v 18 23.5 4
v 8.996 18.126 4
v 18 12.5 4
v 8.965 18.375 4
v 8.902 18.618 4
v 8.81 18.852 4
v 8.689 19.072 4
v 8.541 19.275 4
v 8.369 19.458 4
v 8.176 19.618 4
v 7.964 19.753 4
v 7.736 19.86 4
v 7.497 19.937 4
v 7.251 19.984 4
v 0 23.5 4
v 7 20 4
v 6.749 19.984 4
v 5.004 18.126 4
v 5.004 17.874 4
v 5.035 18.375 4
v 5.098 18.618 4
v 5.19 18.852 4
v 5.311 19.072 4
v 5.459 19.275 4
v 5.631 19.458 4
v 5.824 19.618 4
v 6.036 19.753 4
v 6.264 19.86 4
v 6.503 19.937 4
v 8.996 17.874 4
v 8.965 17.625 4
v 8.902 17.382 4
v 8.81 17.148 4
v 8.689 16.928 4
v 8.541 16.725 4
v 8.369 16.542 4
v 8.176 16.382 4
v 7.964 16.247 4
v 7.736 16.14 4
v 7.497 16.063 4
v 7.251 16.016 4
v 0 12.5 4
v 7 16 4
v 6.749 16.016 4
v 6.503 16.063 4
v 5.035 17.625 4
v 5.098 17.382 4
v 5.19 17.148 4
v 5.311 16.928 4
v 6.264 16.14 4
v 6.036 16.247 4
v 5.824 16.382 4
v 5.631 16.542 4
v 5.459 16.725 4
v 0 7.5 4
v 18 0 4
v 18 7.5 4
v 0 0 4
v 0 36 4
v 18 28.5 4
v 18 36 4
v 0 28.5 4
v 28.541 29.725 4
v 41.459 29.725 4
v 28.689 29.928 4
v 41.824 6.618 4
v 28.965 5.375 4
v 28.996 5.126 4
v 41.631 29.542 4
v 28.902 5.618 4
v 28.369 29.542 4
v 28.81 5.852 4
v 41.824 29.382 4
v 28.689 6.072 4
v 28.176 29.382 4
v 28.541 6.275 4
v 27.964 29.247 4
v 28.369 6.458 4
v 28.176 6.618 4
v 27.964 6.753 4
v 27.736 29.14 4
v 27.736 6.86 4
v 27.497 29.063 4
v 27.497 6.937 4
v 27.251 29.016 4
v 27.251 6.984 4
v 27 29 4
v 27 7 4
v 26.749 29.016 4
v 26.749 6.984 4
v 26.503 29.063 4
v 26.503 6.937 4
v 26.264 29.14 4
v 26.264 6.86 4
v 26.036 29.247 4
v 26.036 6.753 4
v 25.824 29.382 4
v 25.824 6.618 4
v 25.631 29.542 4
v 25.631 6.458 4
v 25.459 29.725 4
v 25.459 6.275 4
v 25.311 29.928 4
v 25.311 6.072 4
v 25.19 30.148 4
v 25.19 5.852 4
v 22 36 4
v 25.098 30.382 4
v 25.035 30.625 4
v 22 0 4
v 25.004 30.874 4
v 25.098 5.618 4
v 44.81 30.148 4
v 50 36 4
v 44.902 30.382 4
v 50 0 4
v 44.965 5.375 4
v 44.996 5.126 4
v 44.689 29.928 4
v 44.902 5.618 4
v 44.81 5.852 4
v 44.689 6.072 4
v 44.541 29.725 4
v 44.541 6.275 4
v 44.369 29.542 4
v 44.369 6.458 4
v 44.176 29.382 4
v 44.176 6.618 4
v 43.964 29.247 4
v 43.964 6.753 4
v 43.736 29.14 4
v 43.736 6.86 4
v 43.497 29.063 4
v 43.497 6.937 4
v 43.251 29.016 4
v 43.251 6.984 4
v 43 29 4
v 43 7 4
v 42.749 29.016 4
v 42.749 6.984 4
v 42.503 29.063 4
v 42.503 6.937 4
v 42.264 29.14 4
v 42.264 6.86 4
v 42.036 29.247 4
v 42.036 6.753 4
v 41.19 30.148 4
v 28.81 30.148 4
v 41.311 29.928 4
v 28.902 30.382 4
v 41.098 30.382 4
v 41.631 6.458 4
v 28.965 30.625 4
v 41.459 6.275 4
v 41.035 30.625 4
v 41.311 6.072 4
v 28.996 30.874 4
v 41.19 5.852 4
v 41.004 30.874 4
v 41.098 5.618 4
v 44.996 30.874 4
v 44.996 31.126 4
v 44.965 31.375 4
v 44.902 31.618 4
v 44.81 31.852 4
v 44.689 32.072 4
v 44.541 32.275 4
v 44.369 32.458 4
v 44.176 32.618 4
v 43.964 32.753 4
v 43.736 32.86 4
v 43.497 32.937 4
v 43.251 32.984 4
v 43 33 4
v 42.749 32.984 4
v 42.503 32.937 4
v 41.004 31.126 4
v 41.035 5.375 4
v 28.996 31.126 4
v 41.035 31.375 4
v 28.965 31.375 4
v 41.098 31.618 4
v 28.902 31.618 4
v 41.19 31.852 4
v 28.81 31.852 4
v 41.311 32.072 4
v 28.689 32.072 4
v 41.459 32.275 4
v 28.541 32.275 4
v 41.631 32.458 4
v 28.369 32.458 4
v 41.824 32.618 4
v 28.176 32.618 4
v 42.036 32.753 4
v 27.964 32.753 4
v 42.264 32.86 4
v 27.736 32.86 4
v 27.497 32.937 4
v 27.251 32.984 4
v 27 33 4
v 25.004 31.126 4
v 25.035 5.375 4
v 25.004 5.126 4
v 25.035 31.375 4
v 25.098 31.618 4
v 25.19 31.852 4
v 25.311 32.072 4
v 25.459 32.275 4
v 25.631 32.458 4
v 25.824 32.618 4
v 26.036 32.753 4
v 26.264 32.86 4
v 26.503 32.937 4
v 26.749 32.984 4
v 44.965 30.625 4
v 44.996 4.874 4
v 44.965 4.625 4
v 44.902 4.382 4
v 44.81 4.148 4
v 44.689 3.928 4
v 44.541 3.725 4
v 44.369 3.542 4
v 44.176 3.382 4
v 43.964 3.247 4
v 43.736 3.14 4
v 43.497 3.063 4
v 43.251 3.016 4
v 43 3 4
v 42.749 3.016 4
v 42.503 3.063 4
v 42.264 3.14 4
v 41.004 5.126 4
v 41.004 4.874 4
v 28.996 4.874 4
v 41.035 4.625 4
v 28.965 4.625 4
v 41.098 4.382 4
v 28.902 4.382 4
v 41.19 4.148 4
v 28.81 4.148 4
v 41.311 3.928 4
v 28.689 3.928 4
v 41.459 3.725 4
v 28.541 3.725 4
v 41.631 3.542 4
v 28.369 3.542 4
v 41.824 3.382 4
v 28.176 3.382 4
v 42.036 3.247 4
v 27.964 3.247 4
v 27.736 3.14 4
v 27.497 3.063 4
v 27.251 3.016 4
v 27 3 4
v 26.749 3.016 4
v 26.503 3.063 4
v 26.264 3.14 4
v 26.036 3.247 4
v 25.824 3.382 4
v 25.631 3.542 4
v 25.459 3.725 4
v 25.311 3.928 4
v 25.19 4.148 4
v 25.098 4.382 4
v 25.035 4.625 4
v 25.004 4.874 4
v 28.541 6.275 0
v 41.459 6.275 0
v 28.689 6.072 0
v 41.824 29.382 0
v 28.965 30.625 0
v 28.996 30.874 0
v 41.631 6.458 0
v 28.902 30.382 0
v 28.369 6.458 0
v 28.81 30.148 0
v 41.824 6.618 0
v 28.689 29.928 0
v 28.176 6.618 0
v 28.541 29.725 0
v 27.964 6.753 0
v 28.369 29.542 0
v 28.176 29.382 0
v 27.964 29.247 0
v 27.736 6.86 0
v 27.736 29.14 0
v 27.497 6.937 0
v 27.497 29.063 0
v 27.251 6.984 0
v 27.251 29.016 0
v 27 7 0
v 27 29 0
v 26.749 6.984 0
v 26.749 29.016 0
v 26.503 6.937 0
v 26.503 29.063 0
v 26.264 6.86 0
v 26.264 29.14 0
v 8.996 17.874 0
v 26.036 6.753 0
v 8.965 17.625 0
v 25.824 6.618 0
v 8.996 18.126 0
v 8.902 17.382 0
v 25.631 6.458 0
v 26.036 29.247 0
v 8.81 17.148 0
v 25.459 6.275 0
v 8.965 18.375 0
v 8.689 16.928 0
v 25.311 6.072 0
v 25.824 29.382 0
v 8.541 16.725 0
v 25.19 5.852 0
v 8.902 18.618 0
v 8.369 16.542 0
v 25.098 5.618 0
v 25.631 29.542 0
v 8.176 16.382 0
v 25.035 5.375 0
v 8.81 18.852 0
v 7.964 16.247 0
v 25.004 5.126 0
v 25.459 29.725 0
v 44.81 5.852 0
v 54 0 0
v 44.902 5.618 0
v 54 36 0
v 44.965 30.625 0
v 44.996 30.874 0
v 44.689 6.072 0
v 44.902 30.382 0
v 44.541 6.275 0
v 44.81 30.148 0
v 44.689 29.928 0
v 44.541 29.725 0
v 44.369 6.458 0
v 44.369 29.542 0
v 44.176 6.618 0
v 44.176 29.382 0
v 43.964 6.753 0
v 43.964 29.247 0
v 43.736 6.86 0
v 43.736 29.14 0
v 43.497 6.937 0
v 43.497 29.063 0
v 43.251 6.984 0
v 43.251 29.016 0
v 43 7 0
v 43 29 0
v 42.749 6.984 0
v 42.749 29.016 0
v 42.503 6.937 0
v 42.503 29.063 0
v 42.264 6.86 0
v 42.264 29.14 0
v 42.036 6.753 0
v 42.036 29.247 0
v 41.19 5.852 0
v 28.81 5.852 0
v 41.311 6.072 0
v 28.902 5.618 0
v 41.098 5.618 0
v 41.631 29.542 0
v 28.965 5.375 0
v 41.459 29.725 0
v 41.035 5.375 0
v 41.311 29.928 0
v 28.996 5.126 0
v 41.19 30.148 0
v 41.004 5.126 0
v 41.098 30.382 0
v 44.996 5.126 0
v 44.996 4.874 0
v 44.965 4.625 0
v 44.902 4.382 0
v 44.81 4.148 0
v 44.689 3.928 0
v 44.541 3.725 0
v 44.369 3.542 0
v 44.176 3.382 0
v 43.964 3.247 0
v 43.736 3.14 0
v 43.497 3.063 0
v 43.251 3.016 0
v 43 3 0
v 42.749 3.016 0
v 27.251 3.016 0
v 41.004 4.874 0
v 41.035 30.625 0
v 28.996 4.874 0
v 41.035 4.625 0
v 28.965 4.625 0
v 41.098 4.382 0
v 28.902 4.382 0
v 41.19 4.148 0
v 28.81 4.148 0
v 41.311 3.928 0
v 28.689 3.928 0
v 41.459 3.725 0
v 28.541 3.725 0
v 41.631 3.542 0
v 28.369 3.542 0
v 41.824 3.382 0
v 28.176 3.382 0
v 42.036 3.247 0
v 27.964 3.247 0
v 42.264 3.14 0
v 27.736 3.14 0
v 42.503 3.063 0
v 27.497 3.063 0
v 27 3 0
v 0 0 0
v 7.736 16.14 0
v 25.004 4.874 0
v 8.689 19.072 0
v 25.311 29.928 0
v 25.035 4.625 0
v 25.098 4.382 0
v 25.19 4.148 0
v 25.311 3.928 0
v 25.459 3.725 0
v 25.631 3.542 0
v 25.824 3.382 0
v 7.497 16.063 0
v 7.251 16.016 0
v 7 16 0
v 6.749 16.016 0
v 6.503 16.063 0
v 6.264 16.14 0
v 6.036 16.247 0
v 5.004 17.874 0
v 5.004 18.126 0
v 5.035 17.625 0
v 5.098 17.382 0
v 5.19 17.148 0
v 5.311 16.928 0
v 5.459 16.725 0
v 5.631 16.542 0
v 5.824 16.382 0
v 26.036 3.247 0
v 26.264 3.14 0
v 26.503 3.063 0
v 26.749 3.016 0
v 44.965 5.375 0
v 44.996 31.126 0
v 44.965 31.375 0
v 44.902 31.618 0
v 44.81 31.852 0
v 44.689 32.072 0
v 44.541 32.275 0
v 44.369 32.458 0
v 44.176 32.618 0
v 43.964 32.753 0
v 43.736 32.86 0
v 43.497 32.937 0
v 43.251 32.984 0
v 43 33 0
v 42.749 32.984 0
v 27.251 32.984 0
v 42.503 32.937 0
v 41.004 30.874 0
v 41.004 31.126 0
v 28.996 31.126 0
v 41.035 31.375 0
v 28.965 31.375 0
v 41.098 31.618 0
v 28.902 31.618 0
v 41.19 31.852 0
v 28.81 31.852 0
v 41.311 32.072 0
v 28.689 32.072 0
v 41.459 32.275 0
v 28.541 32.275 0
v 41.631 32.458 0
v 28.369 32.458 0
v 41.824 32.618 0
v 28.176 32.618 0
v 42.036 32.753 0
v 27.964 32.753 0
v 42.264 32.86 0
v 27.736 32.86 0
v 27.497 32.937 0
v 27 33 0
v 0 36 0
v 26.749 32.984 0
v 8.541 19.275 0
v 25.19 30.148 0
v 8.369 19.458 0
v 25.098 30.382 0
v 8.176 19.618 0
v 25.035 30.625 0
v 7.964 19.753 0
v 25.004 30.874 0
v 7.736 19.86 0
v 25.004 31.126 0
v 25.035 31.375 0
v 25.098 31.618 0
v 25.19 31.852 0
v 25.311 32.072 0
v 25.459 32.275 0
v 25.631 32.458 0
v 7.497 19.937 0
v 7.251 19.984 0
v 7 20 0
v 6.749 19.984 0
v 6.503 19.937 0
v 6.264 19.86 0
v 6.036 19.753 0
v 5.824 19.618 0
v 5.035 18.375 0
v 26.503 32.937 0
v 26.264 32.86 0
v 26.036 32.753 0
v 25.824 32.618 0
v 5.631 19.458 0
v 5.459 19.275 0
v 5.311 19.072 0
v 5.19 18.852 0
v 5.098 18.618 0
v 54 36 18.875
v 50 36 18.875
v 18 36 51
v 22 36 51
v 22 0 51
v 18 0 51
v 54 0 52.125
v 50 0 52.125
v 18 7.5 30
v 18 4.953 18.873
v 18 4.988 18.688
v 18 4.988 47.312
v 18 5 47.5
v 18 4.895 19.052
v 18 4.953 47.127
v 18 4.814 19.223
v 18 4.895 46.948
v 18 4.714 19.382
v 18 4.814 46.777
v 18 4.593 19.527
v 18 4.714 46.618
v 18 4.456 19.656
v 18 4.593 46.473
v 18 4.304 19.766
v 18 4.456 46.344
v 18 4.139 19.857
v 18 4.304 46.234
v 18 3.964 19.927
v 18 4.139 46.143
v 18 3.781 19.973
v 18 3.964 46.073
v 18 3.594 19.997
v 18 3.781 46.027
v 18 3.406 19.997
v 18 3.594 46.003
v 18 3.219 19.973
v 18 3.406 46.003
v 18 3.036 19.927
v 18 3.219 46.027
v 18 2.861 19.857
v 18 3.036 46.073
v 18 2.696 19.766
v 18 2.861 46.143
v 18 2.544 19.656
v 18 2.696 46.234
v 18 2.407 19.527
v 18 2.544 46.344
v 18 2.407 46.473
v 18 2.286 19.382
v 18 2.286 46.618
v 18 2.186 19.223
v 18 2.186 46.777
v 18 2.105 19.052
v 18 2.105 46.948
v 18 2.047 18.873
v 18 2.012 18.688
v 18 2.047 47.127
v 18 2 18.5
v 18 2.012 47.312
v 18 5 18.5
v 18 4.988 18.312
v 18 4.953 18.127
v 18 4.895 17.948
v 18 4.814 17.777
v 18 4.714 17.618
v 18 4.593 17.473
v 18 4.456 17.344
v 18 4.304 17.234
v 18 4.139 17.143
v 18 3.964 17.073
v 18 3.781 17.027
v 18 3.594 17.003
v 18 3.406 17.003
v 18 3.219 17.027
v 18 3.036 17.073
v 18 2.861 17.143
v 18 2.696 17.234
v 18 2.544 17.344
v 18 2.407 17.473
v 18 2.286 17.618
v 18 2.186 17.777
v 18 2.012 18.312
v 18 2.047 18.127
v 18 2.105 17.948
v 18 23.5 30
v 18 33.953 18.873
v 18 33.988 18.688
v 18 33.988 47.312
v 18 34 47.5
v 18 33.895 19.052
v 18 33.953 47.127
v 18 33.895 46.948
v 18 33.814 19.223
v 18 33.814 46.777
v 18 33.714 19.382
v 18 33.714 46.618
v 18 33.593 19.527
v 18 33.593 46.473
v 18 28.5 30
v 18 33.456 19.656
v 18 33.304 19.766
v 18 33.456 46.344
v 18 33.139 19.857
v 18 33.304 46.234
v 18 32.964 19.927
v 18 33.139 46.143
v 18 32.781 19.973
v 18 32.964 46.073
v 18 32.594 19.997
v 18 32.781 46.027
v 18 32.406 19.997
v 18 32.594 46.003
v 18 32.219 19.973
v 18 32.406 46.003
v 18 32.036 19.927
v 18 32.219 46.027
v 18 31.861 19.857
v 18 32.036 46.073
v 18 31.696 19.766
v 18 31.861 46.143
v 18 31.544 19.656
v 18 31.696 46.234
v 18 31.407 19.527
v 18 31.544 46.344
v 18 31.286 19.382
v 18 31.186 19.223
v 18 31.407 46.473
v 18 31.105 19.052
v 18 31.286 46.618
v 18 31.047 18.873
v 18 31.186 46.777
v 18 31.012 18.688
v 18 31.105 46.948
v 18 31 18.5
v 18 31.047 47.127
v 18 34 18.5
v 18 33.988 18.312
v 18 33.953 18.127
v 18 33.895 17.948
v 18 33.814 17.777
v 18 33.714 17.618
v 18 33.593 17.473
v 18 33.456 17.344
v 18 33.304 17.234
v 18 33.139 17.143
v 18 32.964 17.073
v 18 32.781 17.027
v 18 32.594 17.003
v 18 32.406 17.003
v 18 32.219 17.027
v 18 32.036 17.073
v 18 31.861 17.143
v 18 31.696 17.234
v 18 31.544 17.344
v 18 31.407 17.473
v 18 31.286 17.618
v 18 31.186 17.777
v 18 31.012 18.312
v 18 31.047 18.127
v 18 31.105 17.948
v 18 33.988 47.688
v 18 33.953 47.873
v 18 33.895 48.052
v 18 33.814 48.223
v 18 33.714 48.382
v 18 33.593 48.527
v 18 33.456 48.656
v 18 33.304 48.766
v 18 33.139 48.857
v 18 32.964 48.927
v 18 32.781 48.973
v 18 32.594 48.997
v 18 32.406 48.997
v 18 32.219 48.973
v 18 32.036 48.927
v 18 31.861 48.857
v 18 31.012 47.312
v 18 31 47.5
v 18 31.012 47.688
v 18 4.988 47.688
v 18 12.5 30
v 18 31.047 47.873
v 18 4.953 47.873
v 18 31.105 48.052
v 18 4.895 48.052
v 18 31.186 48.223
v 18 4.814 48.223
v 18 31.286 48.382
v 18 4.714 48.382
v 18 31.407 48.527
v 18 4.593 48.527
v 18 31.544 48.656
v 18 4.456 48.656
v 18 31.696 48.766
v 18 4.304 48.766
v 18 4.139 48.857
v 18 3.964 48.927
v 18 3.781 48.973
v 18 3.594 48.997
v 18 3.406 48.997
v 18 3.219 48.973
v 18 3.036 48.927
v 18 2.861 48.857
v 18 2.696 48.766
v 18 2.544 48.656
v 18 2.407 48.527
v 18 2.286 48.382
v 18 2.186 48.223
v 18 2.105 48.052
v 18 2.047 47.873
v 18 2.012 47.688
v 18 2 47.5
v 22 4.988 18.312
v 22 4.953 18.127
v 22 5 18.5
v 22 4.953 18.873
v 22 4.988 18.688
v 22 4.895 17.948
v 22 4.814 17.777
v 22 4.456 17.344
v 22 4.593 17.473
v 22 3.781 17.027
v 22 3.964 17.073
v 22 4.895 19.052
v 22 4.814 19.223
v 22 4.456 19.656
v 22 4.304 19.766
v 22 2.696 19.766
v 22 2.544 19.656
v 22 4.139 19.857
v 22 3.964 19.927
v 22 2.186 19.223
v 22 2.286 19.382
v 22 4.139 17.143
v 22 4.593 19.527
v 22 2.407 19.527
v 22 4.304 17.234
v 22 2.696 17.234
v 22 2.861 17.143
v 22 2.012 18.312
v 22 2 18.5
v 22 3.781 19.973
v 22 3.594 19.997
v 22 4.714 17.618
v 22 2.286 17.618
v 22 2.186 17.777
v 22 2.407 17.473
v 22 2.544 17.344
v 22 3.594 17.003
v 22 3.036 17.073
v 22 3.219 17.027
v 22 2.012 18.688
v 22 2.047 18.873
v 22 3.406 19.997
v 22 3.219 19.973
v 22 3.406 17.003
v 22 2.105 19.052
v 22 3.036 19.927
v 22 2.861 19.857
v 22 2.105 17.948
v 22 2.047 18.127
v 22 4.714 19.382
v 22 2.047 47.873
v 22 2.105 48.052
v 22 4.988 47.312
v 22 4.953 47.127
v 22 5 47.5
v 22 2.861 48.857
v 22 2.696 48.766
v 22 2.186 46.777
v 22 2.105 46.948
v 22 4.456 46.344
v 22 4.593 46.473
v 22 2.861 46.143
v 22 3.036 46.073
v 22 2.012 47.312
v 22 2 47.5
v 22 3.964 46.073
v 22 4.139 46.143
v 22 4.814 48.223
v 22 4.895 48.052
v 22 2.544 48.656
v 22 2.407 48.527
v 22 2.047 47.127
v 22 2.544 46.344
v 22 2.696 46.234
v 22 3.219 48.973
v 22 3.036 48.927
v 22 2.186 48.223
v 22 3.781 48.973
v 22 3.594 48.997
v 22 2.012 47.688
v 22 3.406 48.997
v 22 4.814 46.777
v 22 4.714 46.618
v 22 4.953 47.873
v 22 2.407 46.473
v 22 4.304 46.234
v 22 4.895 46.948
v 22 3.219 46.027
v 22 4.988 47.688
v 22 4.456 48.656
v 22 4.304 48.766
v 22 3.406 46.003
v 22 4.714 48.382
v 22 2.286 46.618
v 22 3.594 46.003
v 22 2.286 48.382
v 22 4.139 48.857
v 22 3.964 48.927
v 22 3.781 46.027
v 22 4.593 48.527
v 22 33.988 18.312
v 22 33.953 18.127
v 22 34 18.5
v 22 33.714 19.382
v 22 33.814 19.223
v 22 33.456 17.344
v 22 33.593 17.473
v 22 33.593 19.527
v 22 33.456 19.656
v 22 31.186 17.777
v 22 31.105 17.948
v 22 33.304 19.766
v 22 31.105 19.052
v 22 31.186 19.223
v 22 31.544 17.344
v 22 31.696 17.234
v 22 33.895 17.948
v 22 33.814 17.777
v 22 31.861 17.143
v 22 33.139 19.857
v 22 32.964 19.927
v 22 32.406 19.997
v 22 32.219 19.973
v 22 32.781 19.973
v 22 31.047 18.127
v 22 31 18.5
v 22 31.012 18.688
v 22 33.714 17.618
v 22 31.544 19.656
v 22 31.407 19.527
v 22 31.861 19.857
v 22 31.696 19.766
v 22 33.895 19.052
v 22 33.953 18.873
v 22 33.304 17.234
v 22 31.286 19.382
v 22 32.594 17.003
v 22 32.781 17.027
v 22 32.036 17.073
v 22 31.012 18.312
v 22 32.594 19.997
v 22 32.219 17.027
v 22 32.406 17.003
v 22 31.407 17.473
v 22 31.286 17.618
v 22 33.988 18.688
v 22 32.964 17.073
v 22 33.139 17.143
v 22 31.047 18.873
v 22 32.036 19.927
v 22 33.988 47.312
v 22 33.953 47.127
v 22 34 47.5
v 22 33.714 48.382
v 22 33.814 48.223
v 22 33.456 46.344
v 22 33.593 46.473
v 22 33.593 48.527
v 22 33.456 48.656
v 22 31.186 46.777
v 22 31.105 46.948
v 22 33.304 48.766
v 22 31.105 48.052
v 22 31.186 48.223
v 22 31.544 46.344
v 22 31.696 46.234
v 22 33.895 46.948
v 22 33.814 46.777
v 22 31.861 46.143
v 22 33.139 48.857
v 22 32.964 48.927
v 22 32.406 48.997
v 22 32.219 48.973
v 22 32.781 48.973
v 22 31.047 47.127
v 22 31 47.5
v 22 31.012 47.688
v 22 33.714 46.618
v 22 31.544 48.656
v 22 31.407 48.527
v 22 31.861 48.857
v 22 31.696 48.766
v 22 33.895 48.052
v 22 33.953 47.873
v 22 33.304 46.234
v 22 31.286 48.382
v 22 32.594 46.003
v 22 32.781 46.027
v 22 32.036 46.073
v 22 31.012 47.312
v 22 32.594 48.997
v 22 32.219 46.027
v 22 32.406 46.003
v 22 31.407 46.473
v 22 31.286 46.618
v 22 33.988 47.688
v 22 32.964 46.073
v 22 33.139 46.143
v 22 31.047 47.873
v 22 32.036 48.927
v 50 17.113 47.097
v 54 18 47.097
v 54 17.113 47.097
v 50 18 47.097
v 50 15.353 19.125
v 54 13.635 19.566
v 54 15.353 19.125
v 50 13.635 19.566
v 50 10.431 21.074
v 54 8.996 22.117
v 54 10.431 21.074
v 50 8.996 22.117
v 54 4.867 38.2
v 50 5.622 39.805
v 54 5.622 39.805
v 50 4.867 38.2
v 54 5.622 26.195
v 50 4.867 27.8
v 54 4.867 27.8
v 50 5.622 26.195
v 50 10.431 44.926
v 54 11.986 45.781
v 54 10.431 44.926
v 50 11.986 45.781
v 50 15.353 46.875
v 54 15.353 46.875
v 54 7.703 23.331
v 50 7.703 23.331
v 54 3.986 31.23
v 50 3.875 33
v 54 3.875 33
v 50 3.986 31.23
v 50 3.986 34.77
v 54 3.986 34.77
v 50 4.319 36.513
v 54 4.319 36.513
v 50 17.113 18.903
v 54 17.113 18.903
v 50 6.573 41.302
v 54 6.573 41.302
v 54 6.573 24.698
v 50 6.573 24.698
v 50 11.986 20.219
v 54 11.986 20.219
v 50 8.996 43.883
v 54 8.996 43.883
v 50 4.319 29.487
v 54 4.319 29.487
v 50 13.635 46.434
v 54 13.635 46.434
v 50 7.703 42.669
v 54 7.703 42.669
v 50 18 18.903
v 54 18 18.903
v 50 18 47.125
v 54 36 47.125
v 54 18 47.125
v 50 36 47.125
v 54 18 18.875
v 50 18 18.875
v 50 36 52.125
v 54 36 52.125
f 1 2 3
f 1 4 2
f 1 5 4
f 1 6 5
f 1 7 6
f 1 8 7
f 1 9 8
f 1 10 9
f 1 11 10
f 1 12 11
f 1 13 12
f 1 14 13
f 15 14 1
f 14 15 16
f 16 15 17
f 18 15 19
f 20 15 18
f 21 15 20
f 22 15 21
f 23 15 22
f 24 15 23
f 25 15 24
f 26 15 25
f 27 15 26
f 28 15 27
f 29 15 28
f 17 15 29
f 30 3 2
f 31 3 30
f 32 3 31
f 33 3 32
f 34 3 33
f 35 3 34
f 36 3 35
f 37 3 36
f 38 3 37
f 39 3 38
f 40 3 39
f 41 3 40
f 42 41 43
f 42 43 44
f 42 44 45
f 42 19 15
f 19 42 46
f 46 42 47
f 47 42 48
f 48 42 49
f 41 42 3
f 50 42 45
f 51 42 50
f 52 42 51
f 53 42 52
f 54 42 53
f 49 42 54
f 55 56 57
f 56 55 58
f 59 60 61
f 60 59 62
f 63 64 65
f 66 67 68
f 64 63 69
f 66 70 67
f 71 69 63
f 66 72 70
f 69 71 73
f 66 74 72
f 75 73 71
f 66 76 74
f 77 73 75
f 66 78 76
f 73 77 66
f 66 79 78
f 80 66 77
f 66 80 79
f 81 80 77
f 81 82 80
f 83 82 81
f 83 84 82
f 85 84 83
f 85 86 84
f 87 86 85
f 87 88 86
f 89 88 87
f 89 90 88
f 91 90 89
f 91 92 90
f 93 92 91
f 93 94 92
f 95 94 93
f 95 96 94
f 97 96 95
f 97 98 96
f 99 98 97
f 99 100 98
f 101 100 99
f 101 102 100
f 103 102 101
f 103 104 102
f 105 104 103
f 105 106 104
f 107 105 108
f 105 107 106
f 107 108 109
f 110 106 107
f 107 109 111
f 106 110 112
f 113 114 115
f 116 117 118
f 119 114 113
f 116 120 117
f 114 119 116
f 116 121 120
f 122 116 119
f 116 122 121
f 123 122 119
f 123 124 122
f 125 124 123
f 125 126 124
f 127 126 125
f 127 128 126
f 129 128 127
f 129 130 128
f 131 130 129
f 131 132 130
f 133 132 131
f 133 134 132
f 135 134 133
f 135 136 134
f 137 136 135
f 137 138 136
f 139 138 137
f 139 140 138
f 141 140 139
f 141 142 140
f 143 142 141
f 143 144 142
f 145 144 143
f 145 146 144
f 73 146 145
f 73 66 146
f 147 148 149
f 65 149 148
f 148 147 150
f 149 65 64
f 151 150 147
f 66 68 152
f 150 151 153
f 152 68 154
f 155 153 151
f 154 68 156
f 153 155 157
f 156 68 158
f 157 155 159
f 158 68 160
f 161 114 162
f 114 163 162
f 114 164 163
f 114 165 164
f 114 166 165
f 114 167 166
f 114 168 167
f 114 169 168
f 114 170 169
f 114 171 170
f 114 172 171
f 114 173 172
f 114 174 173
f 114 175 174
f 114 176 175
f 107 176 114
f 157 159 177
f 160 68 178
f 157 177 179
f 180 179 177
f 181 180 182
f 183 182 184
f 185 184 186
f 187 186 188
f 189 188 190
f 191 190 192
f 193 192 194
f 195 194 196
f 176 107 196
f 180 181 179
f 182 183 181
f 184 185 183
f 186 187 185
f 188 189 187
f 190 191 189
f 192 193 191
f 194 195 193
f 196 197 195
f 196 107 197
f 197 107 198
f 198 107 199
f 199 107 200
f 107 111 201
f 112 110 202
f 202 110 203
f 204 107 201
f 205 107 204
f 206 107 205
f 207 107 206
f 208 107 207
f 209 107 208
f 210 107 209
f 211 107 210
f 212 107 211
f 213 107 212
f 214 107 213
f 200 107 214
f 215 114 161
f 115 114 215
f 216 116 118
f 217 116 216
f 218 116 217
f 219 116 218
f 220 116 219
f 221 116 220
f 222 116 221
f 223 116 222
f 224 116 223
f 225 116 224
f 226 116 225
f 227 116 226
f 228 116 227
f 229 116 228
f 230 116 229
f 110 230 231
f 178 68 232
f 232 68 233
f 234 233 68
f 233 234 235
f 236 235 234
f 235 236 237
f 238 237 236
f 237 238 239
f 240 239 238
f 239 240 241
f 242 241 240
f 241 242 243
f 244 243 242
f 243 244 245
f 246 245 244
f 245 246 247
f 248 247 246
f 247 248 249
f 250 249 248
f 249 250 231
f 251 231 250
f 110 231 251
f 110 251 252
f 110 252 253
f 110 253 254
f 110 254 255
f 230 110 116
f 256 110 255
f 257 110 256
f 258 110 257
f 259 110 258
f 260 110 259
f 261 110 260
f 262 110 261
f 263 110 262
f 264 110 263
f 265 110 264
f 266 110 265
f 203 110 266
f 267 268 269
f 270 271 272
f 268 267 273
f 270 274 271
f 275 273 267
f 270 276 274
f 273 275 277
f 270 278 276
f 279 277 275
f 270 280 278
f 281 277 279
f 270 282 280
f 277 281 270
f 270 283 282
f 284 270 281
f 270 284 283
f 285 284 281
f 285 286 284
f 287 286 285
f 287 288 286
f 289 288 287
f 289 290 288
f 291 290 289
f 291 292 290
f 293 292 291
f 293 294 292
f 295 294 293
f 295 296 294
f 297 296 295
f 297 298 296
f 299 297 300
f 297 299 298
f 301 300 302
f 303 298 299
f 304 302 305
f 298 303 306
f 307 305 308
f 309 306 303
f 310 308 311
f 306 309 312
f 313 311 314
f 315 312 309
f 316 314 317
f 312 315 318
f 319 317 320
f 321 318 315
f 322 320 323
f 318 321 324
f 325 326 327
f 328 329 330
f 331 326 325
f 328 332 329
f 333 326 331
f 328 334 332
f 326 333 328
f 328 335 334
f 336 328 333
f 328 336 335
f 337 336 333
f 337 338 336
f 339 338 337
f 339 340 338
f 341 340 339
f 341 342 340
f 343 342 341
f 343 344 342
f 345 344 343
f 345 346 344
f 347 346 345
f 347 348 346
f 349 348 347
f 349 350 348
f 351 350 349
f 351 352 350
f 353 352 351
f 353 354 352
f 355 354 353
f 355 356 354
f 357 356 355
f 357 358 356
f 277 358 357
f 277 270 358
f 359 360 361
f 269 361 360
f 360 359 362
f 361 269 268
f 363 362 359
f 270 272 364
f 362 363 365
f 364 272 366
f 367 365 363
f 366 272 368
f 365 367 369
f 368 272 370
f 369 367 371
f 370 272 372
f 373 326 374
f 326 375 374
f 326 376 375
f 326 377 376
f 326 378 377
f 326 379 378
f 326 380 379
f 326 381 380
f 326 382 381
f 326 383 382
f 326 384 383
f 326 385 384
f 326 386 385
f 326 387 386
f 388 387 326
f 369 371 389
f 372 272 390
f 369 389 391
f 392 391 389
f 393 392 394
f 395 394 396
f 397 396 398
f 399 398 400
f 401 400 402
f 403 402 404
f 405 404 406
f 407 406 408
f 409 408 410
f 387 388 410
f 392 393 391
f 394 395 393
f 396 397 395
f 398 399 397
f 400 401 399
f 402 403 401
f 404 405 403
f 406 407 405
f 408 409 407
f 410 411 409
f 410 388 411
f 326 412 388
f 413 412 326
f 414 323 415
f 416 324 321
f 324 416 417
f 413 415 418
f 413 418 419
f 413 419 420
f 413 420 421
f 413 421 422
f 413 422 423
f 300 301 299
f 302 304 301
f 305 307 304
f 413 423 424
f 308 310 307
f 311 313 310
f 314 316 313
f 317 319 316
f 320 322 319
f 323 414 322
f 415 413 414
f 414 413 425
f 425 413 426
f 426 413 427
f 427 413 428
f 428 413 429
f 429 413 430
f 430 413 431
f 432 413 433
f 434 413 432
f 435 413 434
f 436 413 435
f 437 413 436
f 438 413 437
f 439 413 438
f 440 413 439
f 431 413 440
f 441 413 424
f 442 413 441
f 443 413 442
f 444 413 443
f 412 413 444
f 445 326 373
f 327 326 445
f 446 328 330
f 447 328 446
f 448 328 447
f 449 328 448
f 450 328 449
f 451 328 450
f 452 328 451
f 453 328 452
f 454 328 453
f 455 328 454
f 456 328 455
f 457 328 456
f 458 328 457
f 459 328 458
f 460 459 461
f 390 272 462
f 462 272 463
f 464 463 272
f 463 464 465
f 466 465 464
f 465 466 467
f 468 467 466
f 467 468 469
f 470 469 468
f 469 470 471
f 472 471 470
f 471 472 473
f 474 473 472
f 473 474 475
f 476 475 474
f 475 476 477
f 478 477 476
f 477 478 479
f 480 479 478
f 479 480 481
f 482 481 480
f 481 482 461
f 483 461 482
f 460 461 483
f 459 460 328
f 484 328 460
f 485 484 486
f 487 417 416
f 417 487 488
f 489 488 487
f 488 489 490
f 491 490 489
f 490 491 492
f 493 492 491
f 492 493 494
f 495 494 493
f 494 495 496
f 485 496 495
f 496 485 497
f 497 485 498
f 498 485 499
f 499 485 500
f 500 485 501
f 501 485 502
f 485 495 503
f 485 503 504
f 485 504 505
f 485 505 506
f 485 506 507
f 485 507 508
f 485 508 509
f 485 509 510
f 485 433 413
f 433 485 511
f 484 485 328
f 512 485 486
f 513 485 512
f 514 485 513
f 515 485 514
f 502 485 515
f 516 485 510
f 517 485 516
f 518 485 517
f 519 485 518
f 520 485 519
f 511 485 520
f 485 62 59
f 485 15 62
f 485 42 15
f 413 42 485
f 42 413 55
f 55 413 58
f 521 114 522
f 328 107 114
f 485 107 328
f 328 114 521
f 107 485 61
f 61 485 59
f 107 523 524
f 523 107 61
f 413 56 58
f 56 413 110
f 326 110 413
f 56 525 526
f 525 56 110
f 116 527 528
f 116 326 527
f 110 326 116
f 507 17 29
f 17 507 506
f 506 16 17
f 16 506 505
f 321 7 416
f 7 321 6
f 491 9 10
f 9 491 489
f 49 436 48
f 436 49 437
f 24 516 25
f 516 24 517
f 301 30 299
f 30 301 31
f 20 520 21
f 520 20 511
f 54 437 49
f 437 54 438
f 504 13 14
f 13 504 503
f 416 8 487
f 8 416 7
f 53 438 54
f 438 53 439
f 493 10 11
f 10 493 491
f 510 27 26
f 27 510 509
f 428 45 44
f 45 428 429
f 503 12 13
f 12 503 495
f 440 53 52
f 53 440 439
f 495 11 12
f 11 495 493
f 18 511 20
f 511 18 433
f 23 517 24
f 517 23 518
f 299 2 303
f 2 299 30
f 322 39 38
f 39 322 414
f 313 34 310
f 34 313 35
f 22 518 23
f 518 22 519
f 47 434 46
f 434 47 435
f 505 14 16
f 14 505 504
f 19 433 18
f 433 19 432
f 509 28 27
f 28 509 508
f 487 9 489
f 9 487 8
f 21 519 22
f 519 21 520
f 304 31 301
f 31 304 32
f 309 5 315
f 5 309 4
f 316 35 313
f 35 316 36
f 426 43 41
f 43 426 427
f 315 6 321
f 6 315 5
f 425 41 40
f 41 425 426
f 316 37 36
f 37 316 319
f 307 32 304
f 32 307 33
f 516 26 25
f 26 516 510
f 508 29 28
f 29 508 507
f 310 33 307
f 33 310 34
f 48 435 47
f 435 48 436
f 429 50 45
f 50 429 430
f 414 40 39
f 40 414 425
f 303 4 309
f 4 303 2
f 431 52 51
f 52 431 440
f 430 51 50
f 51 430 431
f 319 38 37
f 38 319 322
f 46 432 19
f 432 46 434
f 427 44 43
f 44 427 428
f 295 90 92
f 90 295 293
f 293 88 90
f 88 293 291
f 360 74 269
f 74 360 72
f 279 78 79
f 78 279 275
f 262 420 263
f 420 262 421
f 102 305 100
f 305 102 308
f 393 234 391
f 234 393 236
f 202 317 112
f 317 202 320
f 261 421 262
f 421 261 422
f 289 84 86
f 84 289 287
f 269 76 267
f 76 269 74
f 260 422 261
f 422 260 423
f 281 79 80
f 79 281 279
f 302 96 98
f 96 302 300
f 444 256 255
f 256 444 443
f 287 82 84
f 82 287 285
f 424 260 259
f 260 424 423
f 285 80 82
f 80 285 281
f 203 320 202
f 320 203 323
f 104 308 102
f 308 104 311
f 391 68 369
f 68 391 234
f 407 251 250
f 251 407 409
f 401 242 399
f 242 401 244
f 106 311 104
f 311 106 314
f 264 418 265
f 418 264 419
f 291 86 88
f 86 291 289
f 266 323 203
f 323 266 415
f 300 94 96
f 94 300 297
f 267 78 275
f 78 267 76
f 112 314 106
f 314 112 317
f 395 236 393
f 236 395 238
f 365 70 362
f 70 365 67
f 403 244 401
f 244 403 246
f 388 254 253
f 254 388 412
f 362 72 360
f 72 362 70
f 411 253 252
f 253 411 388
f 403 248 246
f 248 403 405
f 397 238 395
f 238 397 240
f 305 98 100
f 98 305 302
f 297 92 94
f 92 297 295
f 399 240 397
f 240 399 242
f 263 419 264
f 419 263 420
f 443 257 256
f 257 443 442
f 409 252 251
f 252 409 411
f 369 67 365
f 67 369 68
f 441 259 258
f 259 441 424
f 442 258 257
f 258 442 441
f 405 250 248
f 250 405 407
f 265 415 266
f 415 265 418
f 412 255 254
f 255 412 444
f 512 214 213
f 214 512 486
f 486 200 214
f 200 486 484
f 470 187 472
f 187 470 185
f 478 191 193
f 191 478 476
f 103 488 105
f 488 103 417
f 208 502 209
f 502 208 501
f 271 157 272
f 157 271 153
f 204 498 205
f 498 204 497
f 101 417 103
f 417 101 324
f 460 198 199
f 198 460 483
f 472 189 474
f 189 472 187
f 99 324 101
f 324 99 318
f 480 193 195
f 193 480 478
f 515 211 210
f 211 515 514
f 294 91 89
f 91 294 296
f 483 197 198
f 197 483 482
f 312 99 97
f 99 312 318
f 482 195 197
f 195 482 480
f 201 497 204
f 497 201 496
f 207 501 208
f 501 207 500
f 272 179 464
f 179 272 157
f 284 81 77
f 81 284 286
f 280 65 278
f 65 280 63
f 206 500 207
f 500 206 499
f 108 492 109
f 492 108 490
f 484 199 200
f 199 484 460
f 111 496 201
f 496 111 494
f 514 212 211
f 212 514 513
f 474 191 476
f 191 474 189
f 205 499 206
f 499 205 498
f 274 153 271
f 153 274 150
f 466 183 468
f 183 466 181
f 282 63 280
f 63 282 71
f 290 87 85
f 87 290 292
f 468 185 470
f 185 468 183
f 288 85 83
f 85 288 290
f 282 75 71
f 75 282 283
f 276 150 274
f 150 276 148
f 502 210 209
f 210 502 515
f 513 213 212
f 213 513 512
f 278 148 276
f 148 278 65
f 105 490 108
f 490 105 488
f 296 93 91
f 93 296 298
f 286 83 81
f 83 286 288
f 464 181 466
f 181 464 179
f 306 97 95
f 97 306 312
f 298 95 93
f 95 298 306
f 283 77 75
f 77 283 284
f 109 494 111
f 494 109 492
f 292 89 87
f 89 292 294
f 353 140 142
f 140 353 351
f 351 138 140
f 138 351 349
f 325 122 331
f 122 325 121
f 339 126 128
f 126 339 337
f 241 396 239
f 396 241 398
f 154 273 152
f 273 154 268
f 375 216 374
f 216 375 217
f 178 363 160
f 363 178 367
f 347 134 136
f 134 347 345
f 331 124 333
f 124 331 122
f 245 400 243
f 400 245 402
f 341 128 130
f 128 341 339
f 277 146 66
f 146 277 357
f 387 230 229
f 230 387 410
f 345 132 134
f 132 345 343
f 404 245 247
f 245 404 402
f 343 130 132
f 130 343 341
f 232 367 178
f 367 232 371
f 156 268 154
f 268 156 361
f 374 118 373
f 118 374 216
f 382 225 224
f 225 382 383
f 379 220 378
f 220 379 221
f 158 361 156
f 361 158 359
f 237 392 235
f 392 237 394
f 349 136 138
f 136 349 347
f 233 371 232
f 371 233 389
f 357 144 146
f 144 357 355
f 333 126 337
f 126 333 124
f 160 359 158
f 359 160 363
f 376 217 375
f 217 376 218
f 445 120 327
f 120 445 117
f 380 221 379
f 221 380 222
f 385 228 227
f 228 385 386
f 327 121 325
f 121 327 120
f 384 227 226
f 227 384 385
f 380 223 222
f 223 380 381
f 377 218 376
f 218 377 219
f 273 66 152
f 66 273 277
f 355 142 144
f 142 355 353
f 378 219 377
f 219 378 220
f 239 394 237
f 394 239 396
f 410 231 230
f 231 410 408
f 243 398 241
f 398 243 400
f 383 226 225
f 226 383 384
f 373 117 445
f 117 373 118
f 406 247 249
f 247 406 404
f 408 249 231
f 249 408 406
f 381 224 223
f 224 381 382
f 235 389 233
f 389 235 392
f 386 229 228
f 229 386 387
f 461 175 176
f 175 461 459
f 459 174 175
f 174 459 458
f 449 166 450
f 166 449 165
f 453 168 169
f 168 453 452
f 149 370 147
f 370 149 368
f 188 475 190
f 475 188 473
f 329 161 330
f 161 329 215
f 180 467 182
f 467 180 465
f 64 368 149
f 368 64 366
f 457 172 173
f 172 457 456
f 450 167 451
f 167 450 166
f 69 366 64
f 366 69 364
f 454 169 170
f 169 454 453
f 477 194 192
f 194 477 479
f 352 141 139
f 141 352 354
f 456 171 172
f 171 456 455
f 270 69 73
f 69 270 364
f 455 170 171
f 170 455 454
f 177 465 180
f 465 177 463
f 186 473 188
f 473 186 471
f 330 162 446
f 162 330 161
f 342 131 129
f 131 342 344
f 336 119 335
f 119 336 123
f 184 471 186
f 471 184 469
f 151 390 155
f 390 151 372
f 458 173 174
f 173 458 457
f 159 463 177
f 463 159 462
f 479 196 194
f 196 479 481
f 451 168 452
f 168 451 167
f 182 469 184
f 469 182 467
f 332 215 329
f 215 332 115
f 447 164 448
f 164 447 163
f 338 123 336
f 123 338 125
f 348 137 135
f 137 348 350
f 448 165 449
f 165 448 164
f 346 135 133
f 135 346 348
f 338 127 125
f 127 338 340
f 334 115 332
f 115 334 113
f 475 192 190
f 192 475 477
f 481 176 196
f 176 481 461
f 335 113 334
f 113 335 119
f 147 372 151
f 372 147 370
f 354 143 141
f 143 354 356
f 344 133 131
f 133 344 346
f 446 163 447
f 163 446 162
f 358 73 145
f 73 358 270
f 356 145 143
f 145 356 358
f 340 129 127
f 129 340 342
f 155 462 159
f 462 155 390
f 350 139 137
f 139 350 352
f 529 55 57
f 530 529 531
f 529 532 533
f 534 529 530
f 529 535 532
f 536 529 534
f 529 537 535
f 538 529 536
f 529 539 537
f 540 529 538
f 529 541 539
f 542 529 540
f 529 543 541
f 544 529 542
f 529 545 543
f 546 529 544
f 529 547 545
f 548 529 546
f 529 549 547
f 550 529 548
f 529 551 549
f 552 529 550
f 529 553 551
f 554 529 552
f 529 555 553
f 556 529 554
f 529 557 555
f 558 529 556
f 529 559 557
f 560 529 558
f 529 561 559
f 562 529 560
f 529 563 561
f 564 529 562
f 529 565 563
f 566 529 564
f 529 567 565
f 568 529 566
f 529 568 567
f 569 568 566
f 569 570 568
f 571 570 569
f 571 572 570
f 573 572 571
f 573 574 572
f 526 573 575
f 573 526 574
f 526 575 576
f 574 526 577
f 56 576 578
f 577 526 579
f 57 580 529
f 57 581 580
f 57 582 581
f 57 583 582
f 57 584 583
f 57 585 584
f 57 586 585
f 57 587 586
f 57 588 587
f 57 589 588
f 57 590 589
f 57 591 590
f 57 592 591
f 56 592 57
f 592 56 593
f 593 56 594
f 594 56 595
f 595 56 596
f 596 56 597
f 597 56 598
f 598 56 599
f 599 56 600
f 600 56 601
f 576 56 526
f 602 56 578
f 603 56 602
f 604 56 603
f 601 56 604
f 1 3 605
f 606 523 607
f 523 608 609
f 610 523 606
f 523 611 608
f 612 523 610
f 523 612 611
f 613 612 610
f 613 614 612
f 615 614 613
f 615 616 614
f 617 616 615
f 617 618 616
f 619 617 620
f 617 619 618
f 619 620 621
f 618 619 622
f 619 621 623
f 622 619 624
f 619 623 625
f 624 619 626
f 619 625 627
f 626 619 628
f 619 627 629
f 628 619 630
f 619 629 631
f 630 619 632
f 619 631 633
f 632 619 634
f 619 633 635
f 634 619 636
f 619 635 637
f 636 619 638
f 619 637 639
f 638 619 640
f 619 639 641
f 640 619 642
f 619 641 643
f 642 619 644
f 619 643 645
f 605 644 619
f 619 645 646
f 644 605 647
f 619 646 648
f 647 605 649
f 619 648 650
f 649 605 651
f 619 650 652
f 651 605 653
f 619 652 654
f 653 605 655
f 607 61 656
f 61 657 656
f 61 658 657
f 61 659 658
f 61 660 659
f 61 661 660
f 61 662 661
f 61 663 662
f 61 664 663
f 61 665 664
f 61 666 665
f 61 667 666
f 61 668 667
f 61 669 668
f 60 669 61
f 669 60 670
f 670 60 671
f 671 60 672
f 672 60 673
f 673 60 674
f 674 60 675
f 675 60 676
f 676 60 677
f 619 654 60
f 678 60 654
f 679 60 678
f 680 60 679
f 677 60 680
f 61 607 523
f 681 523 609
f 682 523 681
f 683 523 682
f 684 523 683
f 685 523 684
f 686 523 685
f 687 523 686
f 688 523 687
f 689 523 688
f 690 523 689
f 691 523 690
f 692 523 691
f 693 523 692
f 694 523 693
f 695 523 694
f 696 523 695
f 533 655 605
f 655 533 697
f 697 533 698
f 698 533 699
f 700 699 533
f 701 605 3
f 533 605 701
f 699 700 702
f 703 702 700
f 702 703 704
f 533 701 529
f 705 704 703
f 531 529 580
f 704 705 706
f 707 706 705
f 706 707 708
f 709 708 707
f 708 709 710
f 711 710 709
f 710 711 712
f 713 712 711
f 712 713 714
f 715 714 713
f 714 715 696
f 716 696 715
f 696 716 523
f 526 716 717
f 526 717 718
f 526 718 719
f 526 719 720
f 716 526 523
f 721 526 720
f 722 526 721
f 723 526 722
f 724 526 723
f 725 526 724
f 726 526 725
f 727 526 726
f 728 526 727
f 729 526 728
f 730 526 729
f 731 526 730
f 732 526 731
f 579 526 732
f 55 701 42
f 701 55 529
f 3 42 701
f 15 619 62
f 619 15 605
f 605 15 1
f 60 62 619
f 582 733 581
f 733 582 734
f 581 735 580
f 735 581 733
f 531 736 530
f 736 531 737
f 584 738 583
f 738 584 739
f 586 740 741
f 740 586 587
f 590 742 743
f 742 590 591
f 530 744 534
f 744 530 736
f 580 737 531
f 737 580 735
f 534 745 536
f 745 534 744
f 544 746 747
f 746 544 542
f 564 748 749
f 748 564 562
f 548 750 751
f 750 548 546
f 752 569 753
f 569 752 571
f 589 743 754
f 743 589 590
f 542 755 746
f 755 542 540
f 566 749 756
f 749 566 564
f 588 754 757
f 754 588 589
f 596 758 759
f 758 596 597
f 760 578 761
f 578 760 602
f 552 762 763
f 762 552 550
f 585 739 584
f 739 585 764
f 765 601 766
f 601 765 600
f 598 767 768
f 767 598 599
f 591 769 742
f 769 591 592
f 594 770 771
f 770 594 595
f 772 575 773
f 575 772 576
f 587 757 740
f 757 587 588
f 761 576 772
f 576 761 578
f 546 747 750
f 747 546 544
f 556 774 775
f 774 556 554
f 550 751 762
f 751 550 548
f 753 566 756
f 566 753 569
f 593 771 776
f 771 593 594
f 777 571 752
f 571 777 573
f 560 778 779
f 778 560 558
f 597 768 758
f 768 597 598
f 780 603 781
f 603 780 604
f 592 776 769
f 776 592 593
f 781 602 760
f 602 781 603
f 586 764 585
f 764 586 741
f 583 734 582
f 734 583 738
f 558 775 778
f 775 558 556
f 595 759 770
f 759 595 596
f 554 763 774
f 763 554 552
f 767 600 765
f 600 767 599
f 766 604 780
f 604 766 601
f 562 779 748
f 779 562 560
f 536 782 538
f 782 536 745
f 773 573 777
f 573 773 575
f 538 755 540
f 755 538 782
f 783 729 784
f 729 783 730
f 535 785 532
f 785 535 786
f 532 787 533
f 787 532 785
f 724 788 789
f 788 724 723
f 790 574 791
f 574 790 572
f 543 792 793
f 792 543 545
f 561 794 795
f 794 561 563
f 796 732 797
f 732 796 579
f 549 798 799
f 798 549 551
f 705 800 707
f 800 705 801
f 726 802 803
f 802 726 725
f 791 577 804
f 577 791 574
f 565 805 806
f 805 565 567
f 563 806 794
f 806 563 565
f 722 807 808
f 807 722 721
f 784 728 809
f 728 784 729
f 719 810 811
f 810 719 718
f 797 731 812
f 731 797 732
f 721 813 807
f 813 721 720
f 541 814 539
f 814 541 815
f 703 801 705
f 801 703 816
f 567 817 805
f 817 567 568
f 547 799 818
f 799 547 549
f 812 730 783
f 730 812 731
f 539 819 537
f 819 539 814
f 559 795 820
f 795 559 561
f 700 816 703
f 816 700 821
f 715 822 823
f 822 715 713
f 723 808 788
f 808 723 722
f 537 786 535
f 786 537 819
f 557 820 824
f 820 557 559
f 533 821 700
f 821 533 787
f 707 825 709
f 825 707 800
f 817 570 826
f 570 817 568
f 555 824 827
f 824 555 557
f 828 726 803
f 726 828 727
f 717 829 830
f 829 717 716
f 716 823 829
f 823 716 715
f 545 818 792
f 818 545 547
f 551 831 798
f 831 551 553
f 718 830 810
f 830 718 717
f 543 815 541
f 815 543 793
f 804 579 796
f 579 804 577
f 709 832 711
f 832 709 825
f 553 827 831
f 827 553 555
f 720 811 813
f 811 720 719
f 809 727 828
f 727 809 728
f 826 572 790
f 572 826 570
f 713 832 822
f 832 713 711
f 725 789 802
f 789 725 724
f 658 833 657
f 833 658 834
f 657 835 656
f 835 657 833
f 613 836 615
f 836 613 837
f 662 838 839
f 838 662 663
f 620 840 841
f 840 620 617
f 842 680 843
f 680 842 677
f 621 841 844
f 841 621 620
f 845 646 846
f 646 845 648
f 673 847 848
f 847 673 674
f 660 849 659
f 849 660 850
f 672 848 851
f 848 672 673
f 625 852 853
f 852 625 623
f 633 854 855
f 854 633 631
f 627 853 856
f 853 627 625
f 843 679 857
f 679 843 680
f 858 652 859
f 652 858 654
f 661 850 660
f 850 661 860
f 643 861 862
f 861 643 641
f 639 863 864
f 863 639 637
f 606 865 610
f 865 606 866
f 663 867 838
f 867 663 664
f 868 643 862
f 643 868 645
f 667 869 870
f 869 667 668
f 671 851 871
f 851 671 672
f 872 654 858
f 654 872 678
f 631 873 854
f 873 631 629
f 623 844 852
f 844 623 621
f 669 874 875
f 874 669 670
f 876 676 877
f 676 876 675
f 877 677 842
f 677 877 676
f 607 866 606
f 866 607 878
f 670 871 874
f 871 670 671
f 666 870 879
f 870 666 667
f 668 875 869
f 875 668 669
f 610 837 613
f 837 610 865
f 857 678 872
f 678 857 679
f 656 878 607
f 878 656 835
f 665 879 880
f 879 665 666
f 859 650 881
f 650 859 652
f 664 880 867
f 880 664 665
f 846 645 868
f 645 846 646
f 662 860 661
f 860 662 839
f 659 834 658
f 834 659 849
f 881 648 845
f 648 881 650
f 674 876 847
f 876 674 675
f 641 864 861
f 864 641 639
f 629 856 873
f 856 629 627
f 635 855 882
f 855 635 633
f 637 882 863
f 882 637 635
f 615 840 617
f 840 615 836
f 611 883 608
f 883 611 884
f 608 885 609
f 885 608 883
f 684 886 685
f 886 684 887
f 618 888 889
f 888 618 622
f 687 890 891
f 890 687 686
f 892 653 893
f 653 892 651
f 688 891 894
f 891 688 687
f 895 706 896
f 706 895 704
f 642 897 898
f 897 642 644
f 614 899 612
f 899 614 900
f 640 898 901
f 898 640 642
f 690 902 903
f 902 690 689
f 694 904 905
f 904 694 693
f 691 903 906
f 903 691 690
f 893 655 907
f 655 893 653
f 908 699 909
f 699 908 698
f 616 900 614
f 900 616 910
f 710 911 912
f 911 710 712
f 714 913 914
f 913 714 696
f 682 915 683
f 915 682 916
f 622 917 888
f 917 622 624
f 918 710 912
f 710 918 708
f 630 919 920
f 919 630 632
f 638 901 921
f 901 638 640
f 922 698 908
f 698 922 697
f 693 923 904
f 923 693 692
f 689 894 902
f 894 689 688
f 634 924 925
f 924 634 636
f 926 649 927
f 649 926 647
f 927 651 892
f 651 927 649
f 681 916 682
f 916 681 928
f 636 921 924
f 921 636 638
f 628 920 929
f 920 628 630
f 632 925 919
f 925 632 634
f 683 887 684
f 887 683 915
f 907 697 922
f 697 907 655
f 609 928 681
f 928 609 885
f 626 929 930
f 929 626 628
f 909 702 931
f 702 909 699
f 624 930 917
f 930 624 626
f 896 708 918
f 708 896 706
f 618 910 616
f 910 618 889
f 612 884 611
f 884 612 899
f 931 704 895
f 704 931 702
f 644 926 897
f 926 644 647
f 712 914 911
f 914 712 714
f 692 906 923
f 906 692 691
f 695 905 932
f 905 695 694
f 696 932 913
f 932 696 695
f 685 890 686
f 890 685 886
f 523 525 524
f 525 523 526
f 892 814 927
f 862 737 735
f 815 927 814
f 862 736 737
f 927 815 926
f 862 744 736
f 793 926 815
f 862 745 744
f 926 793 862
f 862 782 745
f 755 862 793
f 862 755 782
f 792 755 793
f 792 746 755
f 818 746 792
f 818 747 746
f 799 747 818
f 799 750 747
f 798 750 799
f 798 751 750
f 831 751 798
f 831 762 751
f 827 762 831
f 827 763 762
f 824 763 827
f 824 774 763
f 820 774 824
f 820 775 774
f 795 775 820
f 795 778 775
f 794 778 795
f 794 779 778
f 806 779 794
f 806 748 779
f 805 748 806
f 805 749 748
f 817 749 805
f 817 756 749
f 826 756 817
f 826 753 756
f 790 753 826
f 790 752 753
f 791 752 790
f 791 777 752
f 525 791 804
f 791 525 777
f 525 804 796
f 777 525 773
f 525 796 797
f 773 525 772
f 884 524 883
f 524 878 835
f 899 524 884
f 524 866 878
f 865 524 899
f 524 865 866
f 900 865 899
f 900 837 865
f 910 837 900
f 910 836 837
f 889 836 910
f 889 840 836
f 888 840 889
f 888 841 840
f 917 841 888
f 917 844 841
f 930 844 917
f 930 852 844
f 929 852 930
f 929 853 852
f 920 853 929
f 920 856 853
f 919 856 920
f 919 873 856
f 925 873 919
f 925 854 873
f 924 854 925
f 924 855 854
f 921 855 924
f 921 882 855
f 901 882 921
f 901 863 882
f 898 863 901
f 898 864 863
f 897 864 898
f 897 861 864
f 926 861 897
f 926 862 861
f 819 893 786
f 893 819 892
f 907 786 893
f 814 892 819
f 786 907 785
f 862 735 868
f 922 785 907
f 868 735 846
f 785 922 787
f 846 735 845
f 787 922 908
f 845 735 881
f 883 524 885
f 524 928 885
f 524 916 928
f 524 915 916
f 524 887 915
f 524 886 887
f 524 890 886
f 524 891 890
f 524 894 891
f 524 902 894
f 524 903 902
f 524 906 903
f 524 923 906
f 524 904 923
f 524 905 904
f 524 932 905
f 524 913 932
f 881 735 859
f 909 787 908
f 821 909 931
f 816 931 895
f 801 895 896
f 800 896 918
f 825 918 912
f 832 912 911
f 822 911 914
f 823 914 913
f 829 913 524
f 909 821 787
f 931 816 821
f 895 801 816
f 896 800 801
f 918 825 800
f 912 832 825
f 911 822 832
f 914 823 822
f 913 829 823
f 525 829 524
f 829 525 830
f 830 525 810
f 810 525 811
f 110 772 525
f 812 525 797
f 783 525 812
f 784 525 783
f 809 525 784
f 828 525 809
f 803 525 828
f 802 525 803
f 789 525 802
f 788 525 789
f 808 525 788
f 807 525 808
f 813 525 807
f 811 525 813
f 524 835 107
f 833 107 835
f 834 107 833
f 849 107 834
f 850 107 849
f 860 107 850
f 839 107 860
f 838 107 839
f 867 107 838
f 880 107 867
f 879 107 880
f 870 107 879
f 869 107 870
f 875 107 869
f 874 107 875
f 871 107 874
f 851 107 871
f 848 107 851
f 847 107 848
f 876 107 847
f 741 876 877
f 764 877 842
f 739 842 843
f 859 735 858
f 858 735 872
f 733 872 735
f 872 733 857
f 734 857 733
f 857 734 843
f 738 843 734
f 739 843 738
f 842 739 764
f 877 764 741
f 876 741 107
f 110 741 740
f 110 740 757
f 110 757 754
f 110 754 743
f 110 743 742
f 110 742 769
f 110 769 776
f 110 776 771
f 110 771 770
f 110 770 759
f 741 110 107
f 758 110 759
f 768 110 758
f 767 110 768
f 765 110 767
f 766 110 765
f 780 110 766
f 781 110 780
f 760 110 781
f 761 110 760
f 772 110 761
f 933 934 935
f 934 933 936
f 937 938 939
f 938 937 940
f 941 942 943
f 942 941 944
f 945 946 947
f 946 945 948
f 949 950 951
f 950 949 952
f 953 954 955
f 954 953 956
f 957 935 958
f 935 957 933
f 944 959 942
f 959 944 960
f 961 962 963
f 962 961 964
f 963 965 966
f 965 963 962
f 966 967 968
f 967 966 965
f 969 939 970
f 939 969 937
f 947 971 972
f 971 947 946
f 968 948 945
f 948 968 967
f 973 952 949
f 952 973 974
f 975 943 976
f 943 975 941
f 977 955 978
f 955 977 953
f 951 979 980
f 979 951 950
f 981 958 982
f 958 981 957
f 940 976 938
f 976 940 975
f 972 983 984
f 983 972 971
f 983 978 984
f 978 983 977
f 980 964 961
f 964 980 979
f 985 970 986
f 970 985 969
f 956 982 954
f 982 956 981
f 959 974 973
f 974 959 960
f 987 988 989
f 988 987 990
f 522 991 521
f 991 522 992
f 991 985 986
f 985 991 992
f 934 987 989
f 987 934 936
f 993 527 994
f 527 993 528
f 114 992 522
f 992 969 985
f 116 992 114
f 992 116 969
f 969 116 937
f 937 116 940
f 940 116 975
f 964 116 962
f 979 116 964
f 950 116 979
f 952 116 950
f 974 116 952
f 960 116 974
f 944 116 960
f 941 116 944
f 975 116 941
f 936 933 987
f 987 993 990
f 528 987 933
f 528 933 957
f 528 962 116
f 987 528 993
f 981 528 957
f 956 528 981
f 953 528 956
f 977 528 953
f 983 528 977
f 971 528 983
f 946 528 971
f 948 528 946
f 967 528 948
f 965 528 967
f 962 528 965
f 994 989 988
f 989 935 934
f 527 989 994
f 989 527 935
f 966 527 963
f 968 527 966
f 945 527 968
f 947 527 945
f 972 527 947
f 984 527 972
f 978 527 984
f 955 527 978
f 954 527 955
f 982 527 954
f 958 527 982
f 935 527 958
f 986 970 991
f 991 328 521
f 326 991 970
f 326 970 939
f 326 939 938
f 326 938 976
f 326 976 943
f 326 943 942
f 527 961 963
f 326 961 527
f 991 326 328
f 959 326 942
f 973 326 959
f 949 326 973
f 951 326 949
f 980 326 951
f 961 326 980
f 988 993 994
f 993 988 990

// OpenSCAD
PRECISION = 50;
THICKNESS = 4;

CAM_DISTANCE_FROM_BASE = 15;
CAM_WIDTH = 36;
CAM_HEIGHT = 36;
CAM_HOLE_SPACING = 29;
CAM_HOLE_D = 3;
CAM_HOLE_R = CAM_HOLE_D/2;
CAM_TOTAL_HEIGHT = CAM_DISTANCE_FROM_BASE + CAM_HEIGHT;
CAM_HOLE_OFFSET = (CAM_WIDTH - CAM_HOLE_SPACING)/2;
//CAM_HEIGHT = OFFSET_CENTER/2 + CAM_WIDTH/2;
//CAM_HOLE_POSITION = THICKNESS + CAM_HEIGHT - CAM_WIDTH;

LENS_CENTER_FROM_BASE = 33;
LENS_D = 28.25;
LENS_R = LENS_D/2;
DISTANCE_LENS = 27;
LENS_BUFFER = 5;
LENS_TOTAL_HEIGHT = LENS_CENTER_FROM_BASE + LENS_R + LENS_BUFFER;

BRACE_LENGTH = 18;
BRACE_HEIGHT = 26;
BRACE_THICKNESS = 5;
BRACE_OFFSET = 10;

BASE_LENGTH = BRACE_LENGTH + THICKNESS + DISTANCE_LENS + THICKNESS;
BASE_WIDTH = CAM_WIDTH;
BASE_HOLE_D = 4;
BASE_HOLE_R = BASE_HOLE_D/2;
BASE_POS0 = 7;
BASE_POS1 = 27;
BASE_POS2 = 43;
BASE_HOLD_OFFSET = 5;

module prism(l, w, h){
   polyhedron(
       points=[[0,0,0], [l,0,0], [l,w,0], [0,w,0], [0,w,h], [l,w,h]],
       faces=[[0,1,2,3],[5,4,3,2],[0,4,5,1],[0,3,4],[5,2,1]]
    );   
}

module hole(r){
    rotate ([0,0,90]) {
        cylinder (h=10, r=r, center=true, $fn=PRECISION);
    }
}

// Base
difference() {
    cube([BASE_LENGTH, BASE_WIDTH, THICKNESS]);
    translate([BASE_POS0, BASE_WIDTH/2,0]){
        hole(BASE_HOLE_R);
    }
    translate([BASE_POS1, BASE_HOLD_OFFSET,0]){
        hole(BASE_HOLE_R);
    }
    translate([BASE_POS1, BASE_WIDTH-BASE_HOLD_OFFSET,0]){
        hole(BASE_HOLE_R);
    }
    translate([BASE_POS2, BASE_HOLD_OFFSET,0]){
        hole(BASE_HOLE_R);
    }
    translate([BASE_POS2, BASE_WIDTH-BASE_HOLD_OFFSET,0]){
        hole(BASE_HOLE_R);
    }
}

translate([THICKNESS,0,0]){
    // Braces
    rotate([0,0,-90]){
        translate([ 0, -THICKNESS, THICKNESS]){
            translate([ -BRACE_OFFSET - BRACE_THICKNESS/2, 0, 0])
            prism( BRACE_THICKNESS, BRACE_LENGTH, BRACE_HEIGHT );
        }

        translate([-CAM_WIDTH, -THICKNESS, THICKNESS]){
            translate([ BRACE_OFFSET - BRACE_THICKNESS/2, 0, 0])
            prism( BRACE_THICKNESS, BRACE_LENGTH, BRACE_HEIGHT );
        }
    }
    
    // Camera plate
    translate([BRACE_LENGTH, 0, 0]) {
        rotate([0,-90,0]){
            difference(){
                cube([CAM_TOTAL_HEIGHT, CAM_WIDTH, THICKNESS]);
                translate([CAM_HOLE_OFFSET + CAM_DISTANCE_FROM_BASE, CAM_HOLE_OFFSET, 0]){
                    hole(CAM_HOLE_R);
                    
                    translate([CAM_HOLE_SPACING, 0, 0])
                    hole(CAM_HOLE_R);
                    
                    translate([0, CAM_HOLE_SPACING, 0])
                    hole(CAM_HOLE_R);

                    translate([CAM_HOLE_SPACING, CAM_HOLE_SPACING, 0])
                    hole(CAM_HOLE_R);
                }
            }
        }
    }

    // Lens plate
    translate([BRACE_LENGTH + DISTANCE_LENS + LENS_BUFFER, 0, 0]) {
        rotate([0,-90,0]){
            difference(){
            cube([LENS_TOTAL_HEIGHT, CAM_WIDTH, THICKNESS]);
                translate([LENS_CENTER_FROM_BASE, CAM_WIDTH/2, 0]){
                    hole(LENS_R);
                    translate([-LENS_R, 0, -4]){
                    cube([LENS_D, LENS_D, 10]);
                    }
                }
            }
        }
    }
}
